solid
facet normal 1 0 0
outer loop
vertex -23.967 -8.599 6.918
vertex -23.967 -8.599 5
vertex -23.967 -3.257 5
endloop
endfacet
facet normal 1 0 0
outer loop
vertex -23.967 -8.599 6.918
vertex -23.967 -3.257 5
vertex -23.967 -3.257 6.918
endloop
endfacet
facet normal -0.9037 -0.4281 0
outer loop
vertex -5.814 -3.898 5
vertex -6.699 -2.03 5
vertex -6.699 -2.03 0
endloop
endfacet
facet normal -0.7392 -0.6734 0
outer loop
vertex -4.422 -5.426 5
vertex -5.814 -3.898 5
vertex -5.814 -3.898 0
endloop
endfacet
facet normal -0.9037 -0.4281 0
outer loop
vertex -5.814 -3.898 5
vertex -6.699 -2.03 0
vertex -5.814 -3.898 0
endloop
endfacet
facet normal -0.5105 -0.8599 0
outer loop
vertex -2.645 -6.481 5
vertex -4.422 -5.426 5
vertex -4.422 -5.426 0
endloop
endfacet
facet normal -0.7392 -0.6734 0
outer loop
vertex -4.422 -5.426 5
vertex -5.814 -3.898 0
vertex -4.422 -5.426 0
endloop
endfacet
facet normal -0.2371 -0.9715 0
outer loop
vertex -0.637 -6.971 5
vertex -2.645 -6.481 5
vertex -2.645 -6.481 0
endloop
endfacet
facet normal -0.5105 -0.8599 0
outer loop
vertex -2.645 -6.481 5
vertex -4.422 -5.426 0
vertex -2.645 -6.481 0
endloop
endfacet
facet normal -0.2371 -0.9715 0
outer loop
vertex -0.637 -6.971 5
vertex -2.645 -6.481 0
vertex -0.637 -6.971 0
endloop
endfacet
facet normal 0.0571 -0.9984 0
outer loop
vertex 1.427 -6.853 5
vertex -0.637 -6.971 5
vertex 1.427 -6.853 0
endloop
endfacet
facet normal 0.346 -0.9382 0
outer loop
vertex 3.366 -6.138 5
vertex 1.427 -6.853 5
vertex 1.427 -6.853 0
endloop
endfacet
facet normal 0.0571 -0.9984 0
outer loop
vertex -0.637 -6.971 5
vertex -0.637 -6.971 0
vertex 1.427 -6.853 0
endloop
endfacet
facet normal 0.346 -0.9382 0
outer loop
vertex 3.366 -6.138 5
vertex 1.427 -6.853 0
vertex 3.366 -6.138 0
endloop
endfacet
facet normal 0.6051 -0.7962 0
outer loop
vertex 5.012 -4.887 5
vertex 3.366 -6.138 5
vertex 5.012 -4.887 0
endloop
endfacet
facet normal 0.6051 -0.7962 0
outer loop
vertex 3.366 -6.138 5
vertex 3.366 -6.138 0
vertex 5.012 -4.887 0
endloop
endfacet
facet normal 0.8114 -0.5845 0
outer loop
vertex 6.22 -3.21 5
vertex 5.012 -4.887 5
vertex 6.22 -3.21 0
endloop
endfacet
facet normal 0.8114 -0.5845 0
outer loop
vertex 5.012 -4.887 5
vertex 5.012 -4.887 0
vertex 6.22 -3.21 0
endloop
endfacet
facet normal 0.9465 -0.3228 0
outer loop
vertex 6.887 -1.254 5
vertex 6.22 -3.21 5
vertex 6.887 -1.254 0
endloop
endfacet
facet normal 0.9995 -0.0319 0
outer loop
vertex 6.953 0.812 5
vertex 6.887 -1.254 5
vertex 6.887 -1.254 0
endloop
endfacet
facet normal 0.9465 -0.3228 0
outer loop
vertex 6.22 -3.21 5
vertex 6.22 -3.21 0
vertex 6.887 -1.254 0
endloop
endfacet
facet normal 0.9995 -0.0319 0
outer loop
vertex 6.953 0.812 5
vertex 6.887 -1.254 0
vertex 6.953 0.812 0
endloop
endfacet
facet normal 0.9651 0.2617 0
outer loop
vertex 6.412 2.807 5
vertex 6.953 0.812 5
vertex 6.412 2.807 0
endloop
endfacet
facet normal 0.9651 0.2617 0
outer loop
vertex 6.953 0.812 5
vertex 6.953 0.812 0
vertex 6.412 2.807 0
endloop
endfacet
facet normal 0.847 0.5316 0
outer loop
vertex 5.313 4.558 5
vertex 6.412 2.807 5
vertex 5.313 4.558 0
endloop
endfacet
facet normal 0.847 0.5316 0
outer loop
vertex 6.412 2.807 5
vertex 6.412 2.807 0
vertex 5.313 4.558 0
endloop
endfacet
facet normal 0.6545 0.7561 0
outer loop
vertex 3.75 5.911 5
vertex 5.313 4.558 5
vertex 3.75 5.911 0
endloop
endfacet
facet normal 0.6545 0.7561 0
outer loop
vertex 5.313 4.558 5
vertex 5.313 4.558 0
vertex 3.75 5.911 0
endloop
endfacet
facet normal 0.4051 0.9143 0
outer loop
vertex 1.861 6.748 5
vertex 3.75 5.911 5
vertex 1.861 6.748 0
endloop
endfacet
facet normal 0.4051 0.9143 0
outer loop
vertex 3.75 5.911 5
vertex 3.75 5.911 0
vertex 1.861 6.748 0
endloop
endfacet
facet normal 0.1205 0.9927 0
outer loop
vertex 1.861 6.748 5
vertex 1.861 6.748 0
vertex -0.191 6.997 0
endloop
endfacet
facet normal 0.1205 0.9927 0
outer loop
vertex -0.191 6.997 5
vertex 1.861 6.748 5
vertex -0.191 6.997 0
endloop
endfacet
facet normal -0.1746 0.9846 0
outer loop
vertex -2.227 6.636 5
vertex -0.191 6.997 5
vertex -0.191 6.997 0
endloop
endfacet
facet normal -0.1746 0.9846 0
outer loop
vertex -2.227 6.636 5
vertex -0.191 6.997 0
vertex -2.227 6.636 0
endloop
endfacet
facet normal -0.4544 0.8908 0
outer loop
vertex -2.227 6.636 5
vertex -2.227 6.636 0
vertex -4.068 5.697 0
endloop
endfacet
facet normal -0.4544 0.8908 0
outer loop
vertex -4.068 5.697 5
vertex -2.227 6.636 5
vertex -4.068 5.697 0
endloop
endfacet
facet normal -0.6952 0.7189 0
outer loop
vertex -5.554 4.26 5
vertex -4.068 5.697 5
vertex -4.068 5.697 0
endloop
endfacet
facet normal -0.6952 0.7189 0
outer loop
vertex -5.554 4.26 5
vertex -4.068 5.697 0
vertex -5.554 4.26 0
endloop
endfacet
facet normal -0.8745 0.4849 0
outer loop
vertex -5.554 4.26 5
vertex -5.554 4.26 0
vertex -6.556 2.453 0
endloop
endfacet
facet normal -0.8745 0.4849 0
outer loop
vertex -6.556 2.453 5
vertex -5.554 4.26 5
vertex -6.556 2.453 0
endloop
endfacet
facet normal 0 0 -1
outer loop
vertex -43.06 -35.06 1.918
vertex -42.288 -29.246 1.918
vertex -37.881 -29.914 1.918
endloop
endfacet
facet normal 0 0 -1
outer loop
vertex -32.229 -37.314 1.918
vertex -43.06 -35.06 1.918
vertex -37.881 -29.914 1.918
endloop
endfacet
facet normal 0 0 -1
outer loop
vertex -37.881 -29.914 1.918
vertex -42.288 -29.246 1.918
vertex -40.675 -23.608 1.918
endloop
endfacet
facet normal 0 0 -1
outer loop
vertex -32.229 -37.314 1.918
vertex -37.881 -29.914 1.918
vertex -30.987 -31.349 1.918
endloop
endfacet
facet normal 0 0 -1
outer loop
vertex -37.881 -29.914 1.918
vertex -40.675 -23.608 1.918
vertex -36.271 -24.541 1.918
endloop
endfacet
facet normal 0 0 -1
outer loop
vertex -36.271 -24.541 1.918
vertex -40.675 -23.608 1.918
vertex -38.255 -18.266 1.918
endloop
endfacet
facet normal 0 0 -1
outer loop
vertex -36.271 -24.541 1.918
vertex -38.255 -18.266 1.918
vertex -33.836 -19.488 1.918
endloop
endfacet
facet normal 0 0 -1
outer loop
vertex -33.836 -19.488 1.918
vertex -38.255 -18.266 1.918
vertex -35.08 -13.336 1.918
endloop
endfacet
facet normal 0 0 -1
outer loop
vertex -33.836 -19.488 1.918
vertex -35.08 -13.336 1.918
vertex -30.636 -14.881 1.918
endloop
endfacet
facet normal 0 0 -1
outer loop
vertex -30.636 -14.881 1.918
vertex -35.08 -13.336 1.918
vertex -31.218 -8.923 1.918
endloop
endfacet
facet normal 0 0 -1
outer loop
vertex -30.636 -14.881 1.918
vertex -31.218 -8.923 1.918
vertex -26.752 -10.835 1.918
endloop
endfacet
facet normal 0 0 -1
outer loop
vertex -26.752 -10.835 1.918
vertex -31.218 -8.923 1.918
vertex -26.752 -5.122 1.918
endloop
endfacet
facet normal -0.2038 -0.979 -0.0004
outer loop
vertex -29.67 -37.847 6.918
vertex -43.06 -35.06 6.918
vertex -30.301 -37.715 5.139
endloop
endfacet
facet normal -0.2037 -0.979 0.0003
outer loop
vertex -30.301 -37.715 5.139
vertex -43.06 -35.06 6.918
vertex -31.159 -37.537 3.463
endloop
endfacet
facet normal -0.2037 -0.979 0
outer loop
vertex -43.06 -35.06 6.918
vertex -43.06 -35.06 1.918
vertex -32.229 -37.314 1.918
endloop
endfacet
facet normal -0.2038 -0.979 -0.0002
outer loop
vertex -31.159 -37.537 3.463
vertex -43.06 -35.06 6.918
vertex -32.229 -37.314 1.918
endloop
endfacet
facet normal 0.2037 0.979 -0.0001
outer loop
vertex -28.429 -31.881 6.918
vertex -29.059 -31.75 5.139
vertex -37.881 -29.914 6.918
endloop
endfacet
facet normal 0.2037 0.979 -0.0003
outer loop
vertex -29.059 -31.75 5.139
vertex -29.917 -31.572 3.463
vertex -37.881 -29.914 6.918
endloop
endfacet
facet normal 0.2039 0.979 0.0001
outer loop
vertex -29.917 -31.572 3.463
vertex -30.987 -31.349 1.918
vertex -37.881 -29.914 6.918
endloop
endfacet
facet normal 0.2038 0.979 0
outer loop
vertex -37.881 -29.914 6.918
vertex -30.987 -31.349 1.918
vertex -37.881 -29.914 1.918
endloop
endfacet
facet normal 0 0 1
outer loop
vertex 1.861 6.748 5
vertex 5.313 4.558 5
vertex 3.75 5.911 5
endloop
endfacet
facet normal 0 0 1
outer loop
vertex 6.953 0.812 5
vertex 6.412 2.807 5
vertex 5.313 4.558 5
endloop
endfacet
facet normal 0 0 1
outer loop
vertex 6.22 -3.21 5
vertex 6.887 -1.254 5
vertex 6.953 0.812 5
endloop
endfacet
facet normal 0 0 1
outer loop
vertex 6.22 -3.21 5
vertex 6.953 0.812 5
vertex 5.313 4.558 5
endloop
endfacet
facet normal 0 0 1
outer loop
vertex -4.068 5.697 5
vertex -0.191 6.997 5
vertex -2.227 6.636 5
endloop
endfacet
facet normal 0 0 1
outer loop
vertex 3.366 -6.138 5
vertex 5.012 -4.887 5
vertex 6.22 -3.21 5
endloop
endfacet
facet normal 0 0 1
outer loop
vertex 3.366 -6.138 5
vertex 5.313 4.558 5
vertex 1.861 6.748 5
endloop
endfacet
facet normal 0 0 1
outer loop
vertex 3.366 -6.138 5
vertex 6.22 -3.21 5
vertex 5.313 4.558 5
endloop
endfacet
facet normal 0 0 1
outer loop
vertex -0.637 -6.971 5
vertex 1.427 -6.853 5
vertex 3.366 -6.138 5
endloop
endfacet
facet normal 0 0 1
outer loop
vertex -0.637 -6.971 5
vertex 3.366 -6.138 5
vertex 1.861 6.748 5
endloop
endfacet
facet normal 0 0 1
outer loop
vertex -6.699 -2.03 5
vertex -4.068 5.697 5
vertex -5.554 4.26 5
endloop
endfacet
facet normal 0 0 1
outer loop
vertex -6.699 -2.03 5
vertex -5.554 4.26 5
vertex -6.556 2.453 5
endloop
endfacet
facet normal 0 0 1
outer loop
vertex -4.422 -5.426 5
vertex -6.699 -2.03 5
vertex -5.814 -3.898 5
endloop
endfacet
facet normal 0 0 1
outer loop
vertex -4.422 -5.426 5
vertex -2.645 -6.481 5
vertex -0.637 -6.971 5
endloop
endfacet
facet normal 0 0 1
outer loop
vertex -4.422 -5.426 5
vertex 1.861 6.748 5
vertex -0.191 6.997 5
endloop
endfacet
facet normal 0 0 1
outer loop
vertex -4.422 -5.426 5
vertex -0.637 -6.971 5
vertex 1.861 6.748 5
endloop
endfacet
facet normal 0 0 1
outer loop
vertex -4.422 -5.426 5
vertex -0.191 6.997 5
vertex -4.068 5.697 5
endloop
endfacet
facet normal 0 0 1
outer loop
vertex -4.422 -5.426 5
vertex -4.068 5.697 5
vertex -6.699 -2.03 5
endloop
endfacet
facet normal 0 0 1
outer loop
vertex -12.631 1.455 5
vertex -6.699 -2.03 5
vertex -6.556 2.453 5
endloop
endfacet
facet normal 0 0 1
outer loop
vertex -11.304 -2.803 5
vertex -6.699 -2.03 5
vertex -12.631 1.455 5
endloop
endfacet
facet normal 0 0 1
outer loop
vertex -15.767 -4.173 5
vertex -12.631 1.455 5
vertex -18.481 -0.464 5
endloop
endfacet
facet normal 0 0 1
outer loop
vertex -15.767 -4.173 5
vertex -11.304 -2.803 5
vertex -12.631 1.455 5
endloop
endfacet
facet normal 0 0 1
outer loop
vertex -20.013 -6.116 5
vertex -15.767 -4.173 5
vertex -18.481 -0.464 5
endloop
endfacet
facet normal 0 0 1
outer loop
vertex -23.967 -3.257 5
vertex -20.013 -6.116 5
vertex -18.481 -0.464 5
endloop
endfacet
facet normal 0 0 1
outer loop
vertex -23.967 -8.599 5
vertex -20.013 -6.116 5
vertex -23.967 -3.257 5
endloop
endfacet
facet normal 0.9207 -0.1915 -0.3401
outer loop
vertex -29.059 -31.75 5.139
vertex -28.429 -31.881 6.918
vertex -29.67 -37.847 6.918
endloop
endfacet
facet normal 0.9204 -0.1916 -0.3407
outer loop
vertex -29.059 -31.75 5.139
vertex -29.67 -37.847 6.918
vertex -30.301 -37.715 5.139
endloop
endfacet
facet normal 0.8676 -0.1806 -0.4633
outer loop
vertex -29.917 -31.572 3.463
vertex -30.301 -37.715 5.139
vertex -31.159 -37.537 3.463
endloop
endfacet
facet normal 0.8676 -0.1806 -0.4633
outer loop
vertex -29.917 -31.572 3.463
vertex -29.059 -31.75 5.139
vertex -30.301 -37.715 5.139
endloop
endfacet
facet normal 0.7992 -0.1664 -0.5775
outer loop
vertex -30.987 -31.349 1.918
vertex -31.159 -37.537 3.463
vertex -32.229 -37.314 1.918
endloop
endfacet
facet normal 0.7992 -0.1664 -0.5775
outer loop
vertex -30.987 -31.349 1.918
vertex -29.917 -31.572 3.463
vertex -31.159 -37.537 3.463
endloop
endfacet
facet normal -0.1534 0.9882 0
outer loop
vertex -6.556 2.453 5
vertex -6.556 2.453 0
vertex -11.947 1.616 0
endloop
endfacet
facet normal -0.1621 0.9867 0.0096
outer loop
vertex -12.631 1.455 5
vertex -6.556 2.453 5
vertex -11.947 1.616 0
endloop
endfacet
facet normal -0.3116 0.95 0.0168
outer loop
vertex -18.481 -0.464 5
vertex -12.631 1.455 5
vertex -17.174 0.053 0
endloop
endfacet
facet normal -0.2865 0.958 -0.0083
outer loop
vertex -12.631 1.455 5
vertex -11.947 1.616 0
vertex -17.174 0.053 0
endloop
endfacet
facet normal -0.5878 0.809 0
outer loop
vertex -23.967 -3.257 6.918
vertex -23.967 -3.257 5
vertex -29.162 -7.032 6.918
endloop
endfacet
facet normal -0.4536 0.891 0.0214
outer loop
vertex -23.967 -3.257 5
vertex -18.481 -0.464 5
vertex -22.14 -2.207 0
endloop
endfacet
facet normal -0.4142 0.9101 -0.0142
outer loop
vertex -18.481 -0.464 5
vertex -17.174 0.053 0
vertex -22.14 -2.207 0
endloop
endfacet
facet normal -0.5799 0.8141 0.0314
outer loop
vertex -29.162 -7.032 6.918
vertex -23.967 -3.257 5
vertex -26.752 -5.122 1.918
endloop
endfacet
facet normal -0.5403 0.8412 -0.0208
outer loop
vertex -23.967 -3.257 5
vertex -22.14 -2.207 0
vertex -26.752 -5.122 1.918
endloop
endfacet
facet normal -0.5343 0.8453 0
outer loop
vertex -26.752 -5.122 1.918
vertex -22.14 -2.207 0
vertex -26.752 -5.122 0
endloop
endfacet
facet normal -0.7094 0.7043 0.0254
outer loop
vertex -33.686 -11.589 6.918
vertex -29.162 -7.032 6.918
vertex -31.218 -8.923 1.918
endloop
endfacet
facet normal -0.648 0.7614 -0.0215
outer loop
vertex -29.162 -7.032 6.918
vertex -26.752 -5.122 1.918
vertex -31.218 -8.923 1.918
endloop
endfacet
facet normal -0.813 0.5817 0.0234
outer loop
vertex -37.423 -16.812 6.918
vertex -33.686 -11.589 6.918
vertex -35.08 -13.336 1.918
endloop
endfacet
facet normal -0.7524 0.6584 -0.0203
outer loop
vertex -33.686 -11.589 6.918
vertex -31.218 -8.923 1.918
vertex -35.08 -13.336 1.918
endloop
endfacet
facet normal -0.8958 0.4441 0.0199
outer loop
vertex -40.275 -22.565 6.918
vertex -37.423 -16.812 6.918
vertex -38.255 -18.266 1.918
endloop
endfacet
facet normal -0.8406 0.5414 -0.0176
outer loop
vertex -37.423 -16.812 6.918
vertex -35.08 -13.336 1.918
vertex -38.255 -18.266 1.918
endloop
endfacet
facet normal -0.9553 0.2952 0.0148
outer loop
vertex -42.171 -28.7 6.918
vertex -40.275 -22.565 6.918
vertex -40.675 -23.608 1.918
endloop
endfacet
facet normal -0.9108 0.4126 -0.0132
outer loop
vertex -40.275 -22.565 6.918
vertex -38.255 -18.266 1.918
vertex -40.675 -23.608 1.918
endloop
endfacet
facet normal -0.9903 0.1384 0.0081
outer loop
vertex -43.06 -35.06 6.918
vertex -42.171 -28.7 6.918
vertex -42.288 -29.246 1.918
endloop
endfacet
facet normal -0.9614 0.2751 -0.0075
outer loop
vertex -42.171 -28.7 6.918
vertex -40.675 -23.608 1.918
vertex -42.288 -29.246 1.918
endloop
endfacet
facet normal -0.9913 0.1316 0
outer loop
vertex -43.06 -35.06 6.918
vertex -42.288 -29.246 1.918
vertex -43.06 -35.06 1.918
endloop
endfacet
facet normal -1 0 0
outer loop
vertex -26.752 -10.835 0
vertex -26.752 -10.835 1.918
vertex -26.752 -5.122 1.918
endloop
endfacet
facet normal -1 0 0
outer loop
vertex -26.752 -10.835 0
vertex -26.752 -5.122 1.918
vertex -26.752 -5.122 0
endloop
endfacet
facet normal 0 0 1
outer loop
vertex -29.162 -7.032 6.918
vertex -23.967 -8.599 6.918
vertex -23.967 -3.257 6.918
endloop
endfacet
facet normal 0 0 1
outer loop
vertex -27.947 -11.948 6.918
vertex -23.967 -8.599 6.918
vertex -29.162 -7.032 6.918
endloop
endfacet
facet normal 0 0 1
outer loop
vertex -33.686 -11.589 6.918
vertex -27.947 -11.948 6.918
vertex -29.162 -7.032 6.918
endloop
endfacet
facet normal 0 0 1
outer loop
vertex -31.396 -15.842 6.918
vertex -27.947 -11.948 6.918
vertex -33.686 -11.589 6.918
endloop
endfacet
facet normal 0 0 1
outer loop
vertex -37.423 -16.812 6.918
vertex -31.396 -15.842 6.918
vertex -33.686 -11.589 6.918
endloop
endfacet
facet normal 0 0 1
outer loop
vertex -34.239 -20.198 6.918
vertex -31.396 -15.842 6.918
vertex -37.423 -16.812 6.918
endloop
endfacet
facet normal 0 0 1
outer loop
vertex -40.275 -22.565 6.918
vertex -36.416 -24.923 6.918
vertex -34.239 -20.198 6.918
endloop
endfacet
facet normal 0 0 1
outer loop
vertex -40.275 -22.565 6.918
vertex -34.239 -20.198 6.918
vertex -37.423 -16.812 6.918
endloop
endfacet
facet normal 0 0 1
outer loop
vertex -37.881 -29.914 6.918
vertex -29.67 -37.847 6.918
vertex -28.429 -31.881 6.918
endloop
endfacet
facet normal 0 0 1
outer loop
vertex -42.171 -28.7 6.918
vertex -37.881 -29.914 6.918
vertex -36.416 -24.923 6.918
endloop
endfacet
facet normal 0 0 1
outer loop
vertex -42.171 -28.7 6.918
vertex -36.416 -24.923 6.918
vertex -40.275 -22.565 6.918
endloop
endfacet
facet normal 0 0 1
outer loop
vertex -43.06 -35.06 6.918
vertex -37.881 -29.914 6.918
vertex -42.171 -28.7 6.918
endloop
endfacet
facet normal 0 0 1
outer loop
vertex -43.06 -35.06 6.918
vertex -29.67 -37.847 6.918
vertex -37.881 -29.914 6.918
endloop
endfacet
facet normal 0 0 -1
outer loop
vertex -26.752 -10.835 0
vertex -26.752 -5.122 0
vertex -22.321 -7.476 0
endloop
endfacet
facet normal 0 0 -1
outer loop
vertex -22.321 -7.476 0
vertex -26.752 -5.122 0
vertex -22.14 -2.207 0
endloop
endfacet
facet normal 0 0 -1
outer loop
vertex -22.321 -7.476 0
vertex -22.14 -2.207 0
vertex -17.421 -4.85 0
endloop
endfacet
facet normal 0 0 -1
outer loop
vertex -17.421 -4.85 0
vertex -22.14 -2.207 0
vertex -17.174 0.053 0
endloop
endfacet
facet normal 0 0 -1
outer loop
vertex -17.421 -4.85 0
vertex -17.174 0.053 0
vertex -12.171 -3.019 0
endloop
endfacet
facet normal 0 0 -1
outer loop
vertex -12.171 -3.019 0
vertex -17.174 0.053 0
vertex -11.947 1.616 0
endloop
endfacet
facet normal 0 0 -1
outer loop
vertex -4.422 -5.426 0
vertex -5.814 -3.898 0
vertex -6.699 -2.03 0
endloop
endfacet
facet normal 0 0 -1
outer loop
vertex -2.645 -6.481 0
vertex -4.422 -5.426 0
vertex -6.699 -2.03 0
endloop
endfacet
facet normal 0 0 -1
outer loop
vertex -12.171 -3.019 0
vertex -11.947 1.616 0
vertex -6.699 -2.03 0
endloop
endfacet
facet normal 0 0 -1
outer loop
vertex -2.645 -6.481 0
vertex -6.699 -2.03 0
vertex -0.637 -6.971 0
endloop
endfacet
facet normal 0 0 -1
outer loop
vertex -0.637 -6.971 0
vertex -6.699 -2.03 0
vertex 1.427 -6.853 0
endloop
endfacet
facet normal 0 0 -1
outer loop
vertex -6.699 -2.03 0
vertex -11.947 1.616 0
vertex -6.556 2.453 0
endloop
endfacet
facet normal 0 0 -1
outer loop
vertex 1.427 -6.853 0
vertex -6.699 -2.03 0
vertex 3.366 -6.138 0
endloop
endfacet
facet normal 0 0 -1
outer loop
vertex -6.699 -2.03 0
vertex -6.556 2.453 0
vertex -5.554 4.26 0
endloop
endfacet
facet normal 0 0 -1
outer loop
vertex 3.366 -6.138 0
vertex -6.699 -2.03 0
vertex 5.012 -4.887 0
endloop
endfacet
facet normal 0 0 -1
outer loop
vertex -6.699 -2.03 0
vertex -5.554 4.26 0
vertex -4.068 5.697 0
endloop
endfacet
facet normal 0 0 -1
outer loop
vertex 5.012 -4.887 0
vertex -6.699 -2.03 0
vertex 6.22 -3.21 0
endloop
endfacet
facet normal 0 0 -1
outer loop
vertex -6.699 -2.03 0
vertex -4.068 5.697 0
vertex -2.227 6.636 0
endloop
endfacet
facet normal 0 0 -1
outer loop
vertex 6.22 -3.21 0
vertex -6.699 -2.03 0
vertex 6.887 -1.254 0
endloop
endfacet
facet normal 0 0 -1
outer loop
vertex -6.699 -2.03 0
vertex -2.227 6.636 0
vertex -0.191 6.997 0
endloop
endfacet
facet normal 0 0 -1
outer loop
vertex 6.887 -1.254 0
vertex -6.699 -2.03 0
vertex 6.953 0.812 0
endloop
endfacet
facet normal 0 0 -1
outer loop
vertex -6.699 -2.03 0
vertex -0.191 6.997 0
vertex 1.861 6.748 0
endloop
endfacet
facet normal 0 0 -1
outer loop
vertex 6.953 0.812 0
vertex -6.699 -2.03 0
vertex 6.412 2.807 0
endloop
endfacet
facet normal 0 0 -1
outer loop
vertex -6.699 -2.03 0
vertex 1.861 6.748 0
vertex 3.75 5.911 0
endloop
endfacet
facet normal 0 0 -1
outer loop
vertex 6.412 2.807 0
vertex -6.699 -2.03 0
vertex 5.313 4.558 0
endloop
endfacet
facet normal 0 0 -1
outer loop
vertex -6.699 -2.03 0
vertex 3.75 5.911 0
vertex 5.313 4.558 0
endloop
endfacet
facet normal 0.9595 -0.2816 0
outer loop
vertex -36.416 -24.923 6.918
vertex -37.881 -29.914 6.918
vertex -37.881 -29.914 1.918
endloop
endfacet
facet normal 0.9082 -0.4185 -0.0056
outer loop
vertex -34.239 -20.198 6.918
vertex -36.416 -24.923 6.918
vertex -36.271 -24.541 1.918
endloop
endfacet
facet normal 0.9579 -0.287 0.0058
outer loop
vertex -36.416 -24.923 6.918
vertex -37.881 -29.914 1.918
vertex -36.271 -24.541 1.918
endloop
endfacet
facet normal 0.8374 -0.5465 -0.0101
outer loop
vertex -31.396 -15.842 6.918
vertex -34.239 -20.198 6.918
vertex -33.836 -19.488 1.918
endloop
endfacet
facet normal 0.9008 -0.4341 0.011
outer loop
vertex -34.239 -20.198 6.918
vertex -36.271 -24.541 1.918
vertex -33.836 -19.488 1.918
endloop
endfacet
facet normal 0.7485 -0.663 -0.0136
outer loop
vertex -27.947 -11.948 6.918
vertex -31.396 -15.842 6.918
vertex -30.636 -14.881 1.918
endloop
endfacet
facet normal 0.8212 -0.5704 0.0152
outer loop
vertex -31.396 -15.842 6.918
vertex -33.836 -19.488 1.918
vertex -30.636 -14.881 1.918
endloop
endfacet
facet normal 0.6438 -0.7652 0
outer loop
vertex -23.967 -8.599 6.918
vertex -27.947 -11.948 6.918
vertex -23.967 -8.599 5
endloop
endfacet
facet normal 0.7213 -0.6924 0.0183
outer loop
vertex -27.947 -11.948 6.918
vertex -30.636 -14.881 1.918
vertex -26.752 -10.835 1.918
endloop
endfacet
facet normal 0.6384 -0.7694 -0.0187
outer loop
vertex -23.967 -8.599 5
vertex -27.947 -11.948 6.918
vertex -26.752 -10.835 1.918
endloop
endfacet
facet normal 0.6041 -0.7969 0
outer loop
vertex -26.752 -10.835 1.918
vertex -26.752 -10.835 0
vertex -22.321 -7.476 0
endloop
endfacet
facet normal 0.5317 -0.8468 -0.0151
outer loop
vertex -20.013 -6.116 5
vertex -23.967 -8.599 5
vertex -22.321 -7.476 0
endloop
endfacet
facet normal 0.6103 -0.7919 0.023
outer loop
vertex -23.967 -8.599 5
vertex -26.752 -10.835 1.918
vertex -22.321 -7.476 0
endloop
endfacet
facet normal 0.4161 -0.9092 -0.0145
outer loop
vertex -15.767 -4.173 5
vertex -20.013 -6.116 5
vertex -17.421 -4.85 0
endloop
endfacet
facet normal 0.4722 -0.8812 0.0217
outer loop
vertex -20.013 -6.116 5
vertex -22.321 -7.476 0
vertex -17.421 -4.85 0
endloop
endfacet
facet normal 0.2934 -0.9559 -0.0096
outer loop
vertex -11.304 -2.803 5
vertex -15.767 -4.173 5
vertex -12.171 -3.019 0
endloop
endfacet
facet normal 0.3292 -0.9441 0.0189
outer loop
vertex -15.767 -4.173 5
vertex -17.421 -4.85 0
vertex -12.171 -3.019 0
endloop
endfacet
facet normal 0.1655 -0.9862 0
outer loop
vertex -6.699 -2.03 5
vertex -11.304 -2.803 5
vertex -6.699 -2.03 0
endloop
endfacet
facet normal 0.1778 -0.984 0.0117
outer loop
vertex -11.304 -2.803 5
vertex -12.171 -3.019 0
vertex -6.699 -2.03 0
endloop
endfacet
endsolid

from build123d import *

# Parameters (mm, degrees)
BOSS_EXTRU_2_DEPTH           = 5
BOSS_EXTRU_3_DEPTH           = 45
ENL_V_MAT_EXTRU_3_DEPTH      = 5
ENL_V_MAT_EXTRU_3_DEPTH_BACK = 73.880031702
ESQUISSE4_4_W                = 16.307493561
ESQUISSE4_4_H                = 1.918484986
ENL_V_MAT_EXTRU_4_DEPTH      = 58.743956008
ENL_V_MAT_EXTRU_6_DEPTH      = 57.375584133


with BuildPart() as part:
    # Esquisse3 → Boss.-Extru.2 (new body)
    with BuildSketch(Plane.XY):
        with BuildLine():
            ThreePointArc((7, 0), (1.246257582, 6.888166813), (-6.556240583, 2.452694319))
            ThreePointArc((-6.556240583, 2.452694319), (-6.99644453, 0.22307834), (-6.699170831, -2.030051767))
            ThreePointArc((-6.699170831, -2.030051767), (1.026110175, -6.924384298), (7, 0))
        make_face()
    extrude(amount=BOSS_EXTRU_2_DEPTH)

    # Esquisse3<3> → Boss.-Extru.3 (add)
    with BuildSketch(Plane.XY):
        with BuildLine():
            ThreePointArc((-6.556240583, 2.452694319), (-31.795381091, -9.503990443), (-43.059714875, -35.059641647))
            Line((-43.059714875, -35.059641647), (-29.67043681, -37.846531887))
            Line((-29.67043681, -37.846531887), (-28.42882324, -31.881349224))
            Line((-28.42882324, -31.881349224), (-37.880972605, -29.913946449))
            ThreePointArc((-37.880972605, -29.913946449), (-26.825365644, -10.900303142), (-6.699170831, -2.030051767))
            ThreePointArc((-6.699170831, -2.030051767), (-6.99644453, 0.22307834), (-6.556240583, 2.452694319))
        make_face()
    extrude(amount=BOSS_EXTRU_3_DEPTH)

    # Esquisse4 → Enlèv. mat.-Extru.3 (cut, two sides: drawn at the far end of the back side and taken through both)
    with BuildSketch(Plane(origin=(0, 0, 0), x_dir=(1, 0, 0), z_dir=(0, 1, 0)).offset(-ENL_V_MAT_EXTRU_3_DEPTH_BACK)):
        Polygon((-6.556240583, -21.643777245), (-6.556240583, -5), (-23.967427217, -5), (-23.967427217, -6.918484986), (-43.059714875, -6.918484986), (-43.059714875, -11.918484986), (-43.059714875, -45), (-43.059714875, -53.527020644), (-6.425184121, -53.527020644), align=None)
    extrude(amount=ENL_V_MAT_EXTRU_3_DEPTH + ENL_V_MAT_EXTRU_3_DEPTH_BACK, mode=Mode.SUBTRACT)

    # Esquisse4<4> → Enlèv. mat.-Extru.4 (cut, through all)
    with BuildSketch(Plane(origin=(0, 0, 0), x_dir=(1, 0, 0), z_dir=(0, 1, 0))):
        with Locations((-34.905968095, -0.959242493)):
            Rectangle(ESQUISSE4_4_W, ESQUISSE4_4_H)
    extrude(amount=-ENL_V_MAT_EXTRU_4_DEPTH, mode=Mode.SUBTRACT)

    # Esquisse5 → Enlèv. mat.-Extru.6 (cut, through all)
    with BuildSketch(Plane(origin=(-7.540837864, -36.229046112, 0), x_dir=(0.9790175257089632, -0.2037760642340011, 0), z_dir=(0.2037760642340011, 0.9790175257089632, 0))):
        with BuildLine():
            Line((-23.948753957, -1.918484986), (-21.33566032, -1.918484986))
            Line((-21.33566032, -1.918484986), (-21.33566032, -6.918484986))
            ThreePointArc((-21.33566032, -6.918484986), (-22.389352617, -4.286338478), (-23.948753957, -1.918484986))
        make_face()
    extrude(amount=-ENL_V_MAT_EXTRU_6_DEPTH, mode=Mode.SUBTRACT)


solid = part.part
